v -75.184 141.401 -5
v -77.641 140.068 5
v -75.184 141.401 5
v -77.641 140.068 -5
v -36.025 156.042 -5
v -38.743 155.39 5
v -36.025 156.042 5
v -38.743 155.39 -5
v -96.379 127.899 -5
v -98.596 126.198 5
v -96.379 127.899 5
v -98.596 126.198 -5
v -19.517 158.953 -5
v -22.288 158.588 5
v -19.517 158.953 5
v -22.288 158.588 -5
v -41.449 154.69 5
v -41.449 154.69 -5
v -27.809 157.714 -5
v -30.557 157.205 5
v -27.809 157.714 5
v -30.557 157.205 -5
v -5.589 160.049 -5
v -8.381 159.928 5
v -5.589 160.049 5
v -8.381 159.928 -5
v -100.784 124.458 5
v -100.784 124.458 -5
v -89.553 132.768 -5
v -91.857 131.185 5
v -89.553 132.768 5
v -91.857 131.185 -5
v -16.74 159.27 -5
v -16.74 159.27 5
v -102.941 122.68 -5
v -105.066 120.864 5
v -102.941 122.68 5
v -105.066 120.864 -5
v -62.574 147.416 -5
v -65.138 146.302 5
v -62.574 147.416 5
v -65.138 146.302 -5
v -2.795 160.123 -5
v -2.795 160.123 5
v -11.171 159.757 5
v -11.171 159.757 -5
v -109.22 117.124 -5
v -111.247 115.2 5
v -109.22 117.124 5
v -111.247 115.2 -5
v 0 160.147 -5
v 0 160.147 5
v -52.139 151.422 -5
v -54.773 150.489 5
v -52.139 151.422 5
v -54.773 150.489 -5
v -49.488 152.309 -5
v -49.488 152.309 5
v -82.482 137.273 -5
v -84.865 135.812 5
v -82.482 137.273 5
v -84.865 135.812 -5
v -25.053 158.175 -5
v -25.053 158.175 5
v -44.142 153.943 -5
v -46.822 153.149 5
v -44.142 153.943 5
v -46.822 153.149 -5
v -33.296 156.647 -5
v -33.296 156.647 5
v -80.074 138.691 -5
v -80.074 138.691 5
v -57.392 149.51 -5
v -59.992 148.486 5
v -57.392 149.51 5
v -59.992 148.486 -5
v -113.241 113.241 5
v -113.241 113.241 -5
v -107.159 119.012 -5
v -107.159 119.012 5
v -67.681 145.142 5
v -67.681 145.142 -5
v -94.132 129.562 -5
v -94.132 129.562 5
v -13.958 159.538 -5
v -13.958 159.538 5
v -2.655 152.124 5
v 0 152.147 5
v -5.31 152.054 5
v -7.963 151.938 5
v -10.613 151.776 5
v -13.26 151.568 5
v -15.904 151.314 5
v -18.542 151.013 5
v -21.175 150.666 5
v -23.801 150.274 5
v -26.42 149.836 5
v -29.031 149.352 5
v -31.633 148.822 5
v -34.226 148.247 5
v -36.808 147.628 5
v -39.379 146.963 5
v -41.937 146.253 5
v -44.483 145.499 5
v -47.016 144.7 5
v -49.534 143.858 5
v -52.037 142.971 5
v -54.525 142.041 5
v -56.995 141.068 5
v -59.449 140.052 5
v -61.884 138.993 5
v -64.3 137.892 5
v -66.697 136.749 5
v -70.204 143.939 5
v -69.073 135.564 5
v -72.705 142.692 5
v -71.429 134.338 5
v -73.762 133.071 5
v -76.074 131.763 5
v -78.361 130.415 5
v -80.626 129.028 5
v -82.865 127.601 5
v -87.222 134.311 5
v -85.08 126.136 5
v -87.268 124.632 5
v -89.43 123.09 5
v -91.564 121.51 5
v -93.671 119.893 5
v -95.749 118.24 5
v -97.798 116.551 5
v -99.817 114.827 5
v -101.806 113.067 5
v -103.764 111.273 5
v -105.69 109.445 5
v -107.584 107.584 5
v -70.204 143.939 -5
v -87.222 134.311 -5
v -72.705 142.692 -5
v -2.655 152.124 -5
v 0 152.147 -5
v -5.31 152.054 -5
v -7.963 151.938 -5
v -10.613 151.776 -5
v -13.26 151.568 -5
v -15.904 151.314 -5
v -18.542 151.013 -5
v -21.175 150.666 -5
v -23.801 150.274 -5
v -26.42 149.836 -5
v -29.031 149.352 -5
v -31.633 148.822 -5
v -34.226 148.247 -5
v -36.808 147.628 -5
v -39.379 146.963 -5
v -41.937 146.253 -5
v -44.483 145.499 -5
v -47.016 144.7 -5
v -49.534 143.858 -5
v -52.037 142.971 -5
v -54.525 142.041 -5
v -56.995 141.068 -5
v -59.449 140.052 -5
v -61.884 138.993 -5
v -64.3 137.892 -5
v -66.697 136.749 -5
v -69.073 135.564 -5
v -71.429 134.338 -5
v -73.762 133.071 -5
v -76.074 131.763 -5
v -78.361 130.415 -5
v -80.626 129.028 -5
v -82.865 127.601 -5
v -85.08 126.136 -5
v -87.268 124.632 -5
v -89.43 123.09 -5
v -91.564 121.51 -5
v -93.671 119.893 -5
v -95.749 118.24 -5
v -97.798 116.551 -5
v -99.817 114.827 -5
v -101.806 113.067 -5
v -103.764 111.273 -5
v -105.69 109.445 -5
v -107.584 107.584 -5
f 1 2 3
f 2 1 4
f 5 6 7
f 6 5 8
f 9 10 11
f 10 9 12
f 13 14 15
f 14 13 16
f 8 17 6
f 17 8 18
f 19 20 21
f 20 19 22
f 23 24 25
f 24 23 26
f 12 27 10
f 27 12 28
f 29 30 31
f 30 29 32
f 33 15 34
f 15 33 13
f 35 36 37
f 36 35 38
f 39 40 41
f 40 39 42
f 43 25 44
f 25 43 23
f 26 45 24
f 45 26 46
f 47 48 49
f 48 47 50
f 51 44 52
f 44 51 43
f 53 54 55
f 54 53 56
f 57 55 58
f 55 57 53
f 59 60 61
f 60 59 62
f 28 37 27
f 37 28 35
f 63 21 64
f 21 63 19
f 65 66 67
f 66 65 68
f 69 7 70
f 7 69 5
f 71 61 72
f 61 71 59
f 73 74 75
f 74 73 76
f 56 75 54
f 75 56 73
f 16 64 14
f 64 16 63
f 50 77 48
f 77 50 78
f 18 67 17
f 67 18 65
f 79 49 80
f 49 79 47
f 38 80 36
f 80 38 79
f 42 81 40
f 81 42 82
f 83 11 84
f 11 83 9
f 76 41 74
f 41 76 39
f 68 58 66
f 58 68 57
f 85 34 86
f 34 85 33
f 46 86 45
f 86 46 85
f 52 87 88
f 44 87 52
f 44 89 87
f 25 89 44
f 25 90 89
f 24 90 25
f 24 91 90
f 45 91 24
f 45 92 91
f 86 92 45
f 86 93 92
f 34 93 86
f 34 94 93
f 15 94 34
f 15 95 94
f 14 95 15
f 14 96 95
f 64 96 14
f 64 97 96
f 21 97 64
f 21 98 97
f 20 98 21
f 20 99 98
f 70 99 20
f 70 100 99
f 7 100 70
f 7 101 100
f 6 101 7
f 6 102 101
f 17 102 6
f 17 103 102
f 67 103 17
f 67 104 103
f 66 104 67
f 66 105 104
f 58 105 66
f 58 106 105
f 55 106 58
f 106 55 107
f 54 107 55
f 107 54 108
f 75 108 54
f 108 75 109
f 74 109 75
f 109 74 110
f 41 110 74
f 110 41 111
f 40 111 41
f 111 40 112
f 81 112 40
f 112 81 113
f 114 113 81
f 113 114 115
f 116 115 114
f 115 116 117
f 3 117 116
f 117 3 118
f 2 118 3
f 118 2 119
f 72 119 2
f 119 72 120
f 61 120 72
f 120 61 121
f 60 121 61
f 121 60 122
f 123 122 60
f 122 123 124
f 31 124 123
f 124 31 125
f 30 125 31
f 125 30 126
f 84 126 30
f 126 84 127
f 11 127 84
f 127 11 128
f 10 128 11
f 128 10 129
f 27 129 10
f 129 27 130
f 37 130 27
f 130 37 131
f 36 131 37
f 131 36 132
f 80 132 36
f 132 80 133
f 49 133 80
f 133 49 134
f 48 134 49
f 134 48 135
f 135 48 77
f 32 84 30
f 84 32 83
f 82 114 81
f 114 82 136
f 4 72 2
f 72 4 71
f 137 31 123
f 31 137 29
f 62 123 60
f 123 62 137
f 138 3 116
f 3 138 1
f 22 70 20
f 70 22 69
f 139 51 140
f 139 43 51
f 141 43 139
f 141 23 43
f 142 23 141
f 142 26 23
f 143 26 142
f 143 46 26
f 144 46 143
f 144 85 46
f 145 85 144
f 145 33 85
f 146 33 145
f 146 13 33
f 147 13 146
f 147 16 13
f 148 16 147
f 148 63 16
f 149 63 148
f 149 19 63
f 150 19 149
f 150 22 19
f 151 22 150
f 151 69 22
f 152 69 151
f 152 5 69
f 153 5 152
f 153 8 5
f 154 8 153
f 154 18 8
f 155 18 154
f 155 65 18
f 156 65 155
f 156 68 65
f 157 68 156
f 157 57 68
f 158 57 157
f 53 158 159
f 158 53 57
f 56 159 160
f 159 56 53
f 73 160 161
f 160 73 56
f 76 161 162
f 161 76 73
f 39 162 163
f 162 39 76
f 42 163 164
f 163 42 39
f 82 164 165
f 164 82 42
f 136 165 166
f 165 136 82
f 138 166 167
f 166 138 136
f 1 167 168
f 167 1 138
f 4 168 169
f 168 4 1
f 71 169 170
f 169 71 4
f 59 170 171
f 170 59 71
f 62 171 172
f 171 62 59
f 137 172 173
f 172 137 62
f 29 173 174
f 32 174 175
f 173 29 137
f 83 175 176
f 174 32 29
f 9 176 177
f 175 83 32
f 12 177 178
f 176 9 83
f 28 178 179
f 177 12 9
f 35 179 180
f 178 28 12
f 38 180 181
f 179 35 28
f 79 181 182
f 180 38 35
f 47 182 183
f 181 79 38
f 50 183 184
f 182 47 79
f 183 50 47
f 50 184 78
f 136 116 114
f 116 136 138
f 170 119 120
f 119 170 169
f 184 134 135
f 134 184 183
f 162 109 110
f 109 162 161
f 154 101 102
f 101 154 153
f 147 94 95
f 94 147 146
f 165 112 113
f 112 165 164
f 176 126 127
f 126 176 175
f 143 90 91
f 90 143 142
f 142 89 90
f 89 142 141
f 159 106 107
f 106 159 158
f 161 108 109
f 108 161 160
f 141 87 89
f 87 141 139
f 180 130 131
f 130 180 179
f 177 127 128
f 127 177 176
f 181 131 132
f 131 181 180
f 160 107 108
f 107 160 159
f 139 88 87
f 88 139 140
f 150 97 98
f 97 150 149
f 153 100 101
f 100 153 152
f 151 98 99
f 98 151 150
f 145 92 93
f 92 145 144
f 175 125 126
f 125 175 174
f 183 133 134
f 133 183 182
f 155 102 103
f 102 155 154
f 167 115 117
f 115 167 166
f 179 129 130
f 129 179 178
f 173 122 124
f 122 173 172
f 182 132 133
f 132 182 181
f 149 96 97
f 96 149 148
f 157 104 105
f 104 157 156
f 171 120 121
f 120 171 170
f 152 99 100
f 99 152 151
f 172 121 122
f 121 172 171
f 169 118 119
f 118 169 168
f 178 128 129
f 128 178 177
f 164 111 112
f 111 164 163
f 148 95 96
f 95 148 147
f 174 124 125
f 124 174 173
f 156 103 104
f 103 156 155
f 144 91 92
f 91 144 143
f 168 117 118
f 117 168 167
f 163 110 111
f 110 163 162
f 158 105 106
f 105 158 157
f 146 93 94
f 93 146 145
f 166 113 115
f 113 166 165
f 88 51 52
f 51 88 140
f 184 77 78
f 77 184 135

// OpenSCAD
// Erellaz
// 6/6/21
// form for carbone cap

$fn=360;
scale=25.4;
id=12.61*scale;

ht=10;
thickness=8;
sector=45; // size in degree of the sector

re=id/2;
ri=re-thickness;

difference(){
    difference(){
        cylinder(h = ht, r = re, center = true);
        cylinder(h = ht*2, r = ri, center = true);
        }
    
    union(){
        translate([0,0,-ht])cube([re*2,re*2,ht*2]);
        rotate([0,0,90+sector])translate([0,0,-ht])cube([re*2,re*2,ht*2]);
        translate([-re,5-2*re,-ht])cube([re*2,re*2,ht*2]);
        }
    }
